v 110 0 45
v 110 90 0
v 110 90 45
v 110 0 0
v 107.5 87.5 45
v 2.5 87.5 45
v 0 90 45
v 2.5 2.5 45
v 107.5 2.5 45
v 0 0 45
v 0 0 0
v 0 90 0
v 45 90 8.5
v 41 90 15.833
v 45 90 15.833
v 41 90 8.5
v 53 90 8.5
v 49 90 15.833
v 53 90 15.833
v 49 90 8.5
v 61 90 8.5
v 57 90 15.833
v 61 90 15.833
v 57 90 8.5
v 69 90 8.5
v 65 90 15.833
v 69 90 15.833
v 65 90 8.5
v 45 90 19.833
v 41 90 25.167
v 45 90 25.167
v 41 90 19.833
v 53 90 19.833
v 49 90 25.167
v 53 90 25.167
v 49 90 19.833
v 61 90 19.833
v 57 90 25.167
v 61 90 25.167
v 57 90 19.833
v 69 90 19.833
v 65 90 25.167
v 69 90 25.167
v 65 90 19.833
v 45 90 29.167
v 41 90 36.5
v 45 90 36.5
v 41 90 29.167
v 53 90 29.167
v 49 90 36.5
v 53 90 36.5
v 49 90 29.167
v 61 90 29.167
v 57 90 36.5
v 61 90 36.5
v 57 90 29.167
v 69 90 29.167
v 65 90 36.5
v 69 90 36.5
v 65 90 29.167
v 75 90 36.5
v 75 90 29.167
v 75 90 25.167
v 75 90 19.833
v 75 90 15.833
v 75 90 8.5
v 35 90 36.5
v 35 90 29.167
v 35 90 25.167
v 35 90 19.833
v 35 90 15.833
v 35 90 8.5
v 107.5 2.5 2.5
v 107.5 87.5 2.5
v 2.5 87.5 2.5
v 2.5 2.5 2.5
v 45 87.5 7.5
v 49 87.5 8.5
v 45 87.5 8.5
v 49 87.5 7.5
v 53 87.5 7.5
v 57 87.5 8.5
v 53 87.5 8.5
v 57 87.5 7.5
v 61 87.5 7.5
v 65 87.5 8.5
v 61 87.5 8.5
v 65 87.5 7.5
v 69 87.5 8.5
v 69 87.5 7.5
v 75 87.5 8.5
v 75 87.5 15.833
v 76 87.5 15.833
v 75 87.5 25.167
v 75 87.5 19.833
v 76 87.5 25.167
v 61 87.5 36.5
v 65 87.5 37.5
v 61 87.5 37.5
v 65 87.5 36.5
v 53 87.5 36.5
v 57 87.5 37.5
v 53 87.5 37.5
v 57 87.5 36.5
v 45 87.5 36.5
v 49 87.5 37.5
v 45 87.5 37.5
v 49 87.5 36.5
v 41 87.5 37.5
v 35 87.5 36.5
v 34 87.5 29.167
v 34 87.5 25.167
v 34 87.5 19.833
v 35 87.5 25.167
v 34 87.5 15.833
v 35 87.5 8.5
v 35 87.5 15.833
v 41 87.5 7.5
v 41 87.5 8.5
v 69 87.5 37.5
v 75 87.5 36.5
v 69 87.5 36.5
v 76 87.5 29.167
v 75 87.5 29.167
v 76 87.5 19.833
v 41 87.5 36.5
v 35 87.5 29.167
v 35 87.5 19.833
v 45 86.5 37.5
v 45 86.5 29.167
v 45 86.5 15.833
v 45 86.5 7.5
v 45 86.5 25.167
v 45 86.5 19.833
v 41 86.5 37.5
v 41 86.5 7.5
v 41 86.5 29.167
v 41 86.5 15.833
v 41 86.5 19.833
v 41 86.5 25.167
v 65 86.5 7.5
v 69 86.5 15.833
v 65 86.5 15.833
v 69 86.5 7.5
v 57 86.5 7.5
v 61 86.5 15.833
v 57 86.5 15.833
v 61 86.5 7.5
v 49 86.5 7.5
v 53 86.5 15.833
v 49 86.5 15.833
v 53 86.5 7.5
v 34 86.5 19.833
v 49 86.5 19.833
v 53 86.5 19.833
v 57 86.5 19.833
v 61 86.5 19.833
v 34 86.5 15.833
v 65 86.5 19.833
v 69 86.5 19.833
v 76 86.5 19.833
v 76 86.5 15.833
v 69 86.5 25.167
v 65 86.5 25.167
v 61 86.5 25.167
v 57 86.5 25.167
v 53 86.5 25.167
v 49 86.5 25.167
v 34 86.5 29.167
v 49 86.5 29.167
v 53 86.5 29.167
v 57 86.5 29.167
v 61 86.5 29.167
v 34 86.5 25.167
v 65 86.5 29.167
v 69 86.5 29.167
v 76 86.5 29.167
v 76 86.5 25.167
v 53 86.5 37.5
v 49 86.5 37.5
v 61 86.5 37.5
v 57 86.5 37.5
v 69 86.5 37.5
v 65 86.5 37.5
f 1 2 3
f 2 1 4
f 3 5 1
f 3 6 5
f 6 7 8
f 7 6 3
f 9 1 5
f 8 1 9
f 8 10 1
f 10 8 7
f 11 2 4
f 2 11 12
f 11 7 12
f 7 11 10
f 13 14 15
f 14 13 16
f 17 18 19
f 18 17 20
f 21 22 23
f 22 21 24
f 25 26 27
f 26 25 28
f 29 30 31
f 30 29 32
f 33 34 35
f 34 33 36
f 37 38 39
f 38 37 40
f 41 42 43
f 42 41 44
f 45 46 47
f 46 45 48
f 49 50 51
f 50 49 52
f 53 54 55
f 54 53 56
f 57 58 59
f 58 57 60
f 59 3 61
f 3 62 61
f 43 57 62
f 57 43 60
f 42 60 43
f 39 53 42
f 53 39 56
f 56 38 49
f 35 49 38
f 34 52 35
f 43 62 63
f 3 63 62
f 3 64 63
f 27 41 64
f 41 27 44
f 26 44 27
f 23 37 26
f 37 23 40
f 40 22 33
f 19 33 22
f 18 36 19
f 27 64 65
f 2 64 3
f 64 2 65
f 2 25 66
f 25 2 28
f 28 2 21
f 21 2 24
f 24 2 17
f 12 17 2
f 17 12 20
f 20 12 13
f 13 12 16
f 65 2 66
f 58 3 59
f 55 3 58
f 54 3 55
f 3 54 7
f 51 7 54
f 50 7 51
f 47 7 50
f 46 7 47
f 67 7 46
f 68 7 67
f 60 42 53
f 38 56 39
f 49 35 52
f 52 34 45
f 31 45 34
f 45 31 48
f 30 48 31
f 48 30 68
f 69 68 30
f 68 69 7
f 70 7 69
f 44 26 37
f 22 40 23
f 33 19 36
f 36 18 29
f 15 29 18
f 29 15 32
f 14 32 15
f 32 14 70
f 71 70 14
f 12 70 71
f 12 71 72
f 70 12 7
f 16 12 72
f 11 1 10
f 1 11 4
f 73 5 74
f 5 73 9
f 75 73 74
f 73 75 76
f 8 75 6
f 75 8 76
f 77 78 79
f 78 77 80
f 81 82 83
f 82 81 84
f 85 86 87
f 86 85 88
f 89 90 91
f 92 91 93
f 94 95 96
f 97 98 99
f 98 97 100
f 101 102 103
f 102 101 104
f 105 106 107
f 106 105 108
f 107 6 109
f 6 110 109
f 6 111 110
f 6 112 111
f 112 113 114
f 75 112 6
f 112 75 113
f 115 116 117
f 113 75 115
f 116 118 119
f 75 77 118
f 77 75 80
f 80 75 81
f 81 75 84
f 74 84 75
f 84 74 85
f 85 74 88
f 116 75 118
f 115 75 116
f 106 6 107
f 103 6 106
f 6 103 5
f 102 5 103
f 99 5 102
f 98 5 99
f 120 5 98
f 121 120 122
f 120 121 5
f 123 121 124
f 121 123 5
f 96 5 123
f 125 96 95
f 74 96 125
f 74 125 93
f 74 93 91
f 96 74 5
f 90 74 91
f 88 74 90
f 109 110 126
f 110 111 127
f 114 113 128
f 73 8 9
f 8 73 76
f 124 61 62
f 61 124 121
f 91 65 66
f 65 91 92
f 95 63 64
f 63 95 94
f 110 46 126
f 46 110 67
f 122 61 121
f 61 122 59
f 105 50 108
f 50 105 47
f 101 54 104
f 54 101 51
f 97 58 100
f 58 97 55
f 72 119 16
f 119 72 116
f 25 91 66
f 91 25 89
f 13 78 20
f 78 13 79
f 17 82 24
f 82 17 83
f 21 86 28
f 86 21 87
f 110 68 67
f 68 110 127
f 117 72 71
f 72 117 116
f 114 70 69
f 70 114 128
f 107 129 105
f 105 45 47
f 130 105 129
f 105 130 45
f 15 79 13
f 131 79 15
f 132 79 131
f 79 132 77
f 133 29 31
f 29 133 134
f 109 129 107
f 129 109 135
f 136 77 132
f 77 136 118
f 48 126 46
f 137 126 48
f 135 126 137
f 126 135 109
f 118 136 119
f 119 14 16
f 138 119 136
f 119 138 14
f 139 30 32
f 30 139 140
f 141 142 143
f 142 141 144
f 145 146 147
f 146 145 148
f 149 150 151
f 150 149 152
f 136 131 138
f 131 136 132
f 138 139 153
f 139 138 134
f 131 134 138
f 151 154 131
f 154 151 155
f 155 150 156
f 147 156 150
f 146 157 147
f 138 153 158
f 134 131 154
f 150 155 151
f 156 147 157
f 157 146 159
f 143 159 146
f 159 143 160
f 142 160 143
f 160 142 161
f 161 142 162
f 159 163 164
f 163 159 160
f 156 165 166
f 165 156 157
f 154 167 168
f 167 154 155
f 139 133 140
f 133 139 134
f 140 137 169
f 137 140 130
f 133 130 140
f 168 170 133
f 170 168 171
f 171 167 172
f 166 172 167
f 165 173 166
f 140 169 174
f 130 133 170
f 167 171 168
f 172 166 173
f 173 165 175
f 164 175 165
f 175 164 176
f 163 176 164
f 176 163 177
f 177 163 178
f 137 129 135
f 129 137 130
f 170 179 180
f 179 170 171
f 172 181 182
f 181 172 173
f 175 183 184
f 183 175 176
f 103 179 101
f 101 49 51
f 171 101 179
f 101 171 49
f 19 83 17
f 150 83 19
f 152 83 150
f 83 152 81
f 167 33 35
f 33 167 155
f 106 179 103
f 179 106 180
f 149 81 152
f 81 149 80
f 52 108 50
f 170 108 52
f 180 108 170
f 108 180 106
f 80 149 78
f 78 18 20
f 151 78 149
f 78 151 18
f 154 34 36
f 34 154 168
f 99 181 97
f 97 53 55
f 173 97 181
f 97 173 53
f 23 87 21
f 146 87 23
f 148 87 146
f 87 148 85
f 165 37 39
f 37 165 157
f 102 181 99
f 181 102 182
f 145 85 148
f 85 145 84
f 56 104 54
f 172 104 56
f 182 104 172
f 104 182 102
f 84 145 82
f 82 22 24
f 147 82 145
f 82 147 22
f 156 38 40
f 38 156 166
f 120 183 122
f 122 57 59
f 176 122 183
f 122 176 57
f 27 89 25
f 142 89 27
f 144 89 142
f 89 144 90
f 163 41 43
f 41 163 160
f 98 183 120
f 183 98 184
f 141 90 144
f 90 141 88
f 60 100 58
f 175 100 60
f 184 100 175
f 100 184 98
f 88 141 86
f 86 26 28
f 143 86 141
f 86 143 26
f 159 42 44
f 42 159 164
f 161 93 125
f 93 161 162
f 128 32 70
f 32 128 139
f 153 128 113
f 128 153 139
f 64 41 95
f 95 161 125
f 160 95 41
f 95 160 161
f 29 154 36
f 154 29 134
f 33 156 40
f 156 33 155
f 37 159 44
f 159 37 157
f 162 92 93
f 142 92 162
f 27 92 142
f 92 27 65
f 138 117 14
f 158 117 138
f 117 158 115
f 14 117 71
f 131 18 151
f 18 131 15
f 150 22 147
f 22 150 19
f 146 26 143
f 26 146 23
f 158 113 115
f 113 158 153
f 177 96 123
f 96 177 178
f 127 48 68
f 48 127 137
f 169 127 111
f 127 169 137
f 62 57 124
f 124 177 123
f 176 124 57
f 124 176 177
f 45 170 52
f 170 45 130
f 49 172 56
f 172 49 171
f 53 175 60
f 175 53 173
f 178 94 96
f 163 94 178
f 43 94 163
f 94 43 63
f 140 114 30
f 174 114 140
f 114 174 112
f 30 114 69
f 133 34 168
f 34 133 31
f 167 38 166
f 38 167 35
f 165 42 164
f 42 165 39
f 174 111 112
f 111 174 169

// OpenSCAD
$fn = 32;

// ----------------------------------------------------------------------
// Vent box: crossgrid enclosure
// ----------------------------------------------------------------------

// --- parameters (mm) ---
box_l = 110;              // box length, X
box_w = 90;               // box width, Y
box_h = 45;               // box height, Z
wall_t = 2.5;             // shell wall thickness
win_l = 40;               // vent window width, X
win_h = 28;               // vent window height, Z
bar_w = 4;                // grid bar width
n_v = 4;                  // vertical bar count
n_h = 2;                  // horizontal bar count

win_z0 = (box_h - win_h) / 2;  // window lower edge Z
v_step = win_l / (n_v + 1);  // vertical bar step
h_step = win_h / (n_h + 1);  // horizontal bar step

difference() {
  union() {
    difference() {
      cube([box_l, box_w, box_h]);
  translate([wall_t, wall_t, wall_t])
    cube([box_l - 2 * wall_t, box_w - 2 * wall_t, box_h]);
  translate([(box_l - win_l) / 2, box_w - wall_t - 1, win_z0])
    cube([win_l, wall_t + 2, win_h]);
    }
    for (i = [1 : n_v])
      translate([(box_l - win_l) / 2 + i * v_step - bar_w / 2,
                 box_w - wall_t - 1, win_z0 - 1])
        cube([bar_w, wall_t + 1, win_h + 2]);
    for (i = [1 : n_h])
      translate([(box_l - win_l) / 2 - 1, box_w - wall_t - 1,
                 win_z0 + i * h_step - bar_w / 2])
        cube([win_l + 2, wall_t + 1, bar_w]);
  }
}
